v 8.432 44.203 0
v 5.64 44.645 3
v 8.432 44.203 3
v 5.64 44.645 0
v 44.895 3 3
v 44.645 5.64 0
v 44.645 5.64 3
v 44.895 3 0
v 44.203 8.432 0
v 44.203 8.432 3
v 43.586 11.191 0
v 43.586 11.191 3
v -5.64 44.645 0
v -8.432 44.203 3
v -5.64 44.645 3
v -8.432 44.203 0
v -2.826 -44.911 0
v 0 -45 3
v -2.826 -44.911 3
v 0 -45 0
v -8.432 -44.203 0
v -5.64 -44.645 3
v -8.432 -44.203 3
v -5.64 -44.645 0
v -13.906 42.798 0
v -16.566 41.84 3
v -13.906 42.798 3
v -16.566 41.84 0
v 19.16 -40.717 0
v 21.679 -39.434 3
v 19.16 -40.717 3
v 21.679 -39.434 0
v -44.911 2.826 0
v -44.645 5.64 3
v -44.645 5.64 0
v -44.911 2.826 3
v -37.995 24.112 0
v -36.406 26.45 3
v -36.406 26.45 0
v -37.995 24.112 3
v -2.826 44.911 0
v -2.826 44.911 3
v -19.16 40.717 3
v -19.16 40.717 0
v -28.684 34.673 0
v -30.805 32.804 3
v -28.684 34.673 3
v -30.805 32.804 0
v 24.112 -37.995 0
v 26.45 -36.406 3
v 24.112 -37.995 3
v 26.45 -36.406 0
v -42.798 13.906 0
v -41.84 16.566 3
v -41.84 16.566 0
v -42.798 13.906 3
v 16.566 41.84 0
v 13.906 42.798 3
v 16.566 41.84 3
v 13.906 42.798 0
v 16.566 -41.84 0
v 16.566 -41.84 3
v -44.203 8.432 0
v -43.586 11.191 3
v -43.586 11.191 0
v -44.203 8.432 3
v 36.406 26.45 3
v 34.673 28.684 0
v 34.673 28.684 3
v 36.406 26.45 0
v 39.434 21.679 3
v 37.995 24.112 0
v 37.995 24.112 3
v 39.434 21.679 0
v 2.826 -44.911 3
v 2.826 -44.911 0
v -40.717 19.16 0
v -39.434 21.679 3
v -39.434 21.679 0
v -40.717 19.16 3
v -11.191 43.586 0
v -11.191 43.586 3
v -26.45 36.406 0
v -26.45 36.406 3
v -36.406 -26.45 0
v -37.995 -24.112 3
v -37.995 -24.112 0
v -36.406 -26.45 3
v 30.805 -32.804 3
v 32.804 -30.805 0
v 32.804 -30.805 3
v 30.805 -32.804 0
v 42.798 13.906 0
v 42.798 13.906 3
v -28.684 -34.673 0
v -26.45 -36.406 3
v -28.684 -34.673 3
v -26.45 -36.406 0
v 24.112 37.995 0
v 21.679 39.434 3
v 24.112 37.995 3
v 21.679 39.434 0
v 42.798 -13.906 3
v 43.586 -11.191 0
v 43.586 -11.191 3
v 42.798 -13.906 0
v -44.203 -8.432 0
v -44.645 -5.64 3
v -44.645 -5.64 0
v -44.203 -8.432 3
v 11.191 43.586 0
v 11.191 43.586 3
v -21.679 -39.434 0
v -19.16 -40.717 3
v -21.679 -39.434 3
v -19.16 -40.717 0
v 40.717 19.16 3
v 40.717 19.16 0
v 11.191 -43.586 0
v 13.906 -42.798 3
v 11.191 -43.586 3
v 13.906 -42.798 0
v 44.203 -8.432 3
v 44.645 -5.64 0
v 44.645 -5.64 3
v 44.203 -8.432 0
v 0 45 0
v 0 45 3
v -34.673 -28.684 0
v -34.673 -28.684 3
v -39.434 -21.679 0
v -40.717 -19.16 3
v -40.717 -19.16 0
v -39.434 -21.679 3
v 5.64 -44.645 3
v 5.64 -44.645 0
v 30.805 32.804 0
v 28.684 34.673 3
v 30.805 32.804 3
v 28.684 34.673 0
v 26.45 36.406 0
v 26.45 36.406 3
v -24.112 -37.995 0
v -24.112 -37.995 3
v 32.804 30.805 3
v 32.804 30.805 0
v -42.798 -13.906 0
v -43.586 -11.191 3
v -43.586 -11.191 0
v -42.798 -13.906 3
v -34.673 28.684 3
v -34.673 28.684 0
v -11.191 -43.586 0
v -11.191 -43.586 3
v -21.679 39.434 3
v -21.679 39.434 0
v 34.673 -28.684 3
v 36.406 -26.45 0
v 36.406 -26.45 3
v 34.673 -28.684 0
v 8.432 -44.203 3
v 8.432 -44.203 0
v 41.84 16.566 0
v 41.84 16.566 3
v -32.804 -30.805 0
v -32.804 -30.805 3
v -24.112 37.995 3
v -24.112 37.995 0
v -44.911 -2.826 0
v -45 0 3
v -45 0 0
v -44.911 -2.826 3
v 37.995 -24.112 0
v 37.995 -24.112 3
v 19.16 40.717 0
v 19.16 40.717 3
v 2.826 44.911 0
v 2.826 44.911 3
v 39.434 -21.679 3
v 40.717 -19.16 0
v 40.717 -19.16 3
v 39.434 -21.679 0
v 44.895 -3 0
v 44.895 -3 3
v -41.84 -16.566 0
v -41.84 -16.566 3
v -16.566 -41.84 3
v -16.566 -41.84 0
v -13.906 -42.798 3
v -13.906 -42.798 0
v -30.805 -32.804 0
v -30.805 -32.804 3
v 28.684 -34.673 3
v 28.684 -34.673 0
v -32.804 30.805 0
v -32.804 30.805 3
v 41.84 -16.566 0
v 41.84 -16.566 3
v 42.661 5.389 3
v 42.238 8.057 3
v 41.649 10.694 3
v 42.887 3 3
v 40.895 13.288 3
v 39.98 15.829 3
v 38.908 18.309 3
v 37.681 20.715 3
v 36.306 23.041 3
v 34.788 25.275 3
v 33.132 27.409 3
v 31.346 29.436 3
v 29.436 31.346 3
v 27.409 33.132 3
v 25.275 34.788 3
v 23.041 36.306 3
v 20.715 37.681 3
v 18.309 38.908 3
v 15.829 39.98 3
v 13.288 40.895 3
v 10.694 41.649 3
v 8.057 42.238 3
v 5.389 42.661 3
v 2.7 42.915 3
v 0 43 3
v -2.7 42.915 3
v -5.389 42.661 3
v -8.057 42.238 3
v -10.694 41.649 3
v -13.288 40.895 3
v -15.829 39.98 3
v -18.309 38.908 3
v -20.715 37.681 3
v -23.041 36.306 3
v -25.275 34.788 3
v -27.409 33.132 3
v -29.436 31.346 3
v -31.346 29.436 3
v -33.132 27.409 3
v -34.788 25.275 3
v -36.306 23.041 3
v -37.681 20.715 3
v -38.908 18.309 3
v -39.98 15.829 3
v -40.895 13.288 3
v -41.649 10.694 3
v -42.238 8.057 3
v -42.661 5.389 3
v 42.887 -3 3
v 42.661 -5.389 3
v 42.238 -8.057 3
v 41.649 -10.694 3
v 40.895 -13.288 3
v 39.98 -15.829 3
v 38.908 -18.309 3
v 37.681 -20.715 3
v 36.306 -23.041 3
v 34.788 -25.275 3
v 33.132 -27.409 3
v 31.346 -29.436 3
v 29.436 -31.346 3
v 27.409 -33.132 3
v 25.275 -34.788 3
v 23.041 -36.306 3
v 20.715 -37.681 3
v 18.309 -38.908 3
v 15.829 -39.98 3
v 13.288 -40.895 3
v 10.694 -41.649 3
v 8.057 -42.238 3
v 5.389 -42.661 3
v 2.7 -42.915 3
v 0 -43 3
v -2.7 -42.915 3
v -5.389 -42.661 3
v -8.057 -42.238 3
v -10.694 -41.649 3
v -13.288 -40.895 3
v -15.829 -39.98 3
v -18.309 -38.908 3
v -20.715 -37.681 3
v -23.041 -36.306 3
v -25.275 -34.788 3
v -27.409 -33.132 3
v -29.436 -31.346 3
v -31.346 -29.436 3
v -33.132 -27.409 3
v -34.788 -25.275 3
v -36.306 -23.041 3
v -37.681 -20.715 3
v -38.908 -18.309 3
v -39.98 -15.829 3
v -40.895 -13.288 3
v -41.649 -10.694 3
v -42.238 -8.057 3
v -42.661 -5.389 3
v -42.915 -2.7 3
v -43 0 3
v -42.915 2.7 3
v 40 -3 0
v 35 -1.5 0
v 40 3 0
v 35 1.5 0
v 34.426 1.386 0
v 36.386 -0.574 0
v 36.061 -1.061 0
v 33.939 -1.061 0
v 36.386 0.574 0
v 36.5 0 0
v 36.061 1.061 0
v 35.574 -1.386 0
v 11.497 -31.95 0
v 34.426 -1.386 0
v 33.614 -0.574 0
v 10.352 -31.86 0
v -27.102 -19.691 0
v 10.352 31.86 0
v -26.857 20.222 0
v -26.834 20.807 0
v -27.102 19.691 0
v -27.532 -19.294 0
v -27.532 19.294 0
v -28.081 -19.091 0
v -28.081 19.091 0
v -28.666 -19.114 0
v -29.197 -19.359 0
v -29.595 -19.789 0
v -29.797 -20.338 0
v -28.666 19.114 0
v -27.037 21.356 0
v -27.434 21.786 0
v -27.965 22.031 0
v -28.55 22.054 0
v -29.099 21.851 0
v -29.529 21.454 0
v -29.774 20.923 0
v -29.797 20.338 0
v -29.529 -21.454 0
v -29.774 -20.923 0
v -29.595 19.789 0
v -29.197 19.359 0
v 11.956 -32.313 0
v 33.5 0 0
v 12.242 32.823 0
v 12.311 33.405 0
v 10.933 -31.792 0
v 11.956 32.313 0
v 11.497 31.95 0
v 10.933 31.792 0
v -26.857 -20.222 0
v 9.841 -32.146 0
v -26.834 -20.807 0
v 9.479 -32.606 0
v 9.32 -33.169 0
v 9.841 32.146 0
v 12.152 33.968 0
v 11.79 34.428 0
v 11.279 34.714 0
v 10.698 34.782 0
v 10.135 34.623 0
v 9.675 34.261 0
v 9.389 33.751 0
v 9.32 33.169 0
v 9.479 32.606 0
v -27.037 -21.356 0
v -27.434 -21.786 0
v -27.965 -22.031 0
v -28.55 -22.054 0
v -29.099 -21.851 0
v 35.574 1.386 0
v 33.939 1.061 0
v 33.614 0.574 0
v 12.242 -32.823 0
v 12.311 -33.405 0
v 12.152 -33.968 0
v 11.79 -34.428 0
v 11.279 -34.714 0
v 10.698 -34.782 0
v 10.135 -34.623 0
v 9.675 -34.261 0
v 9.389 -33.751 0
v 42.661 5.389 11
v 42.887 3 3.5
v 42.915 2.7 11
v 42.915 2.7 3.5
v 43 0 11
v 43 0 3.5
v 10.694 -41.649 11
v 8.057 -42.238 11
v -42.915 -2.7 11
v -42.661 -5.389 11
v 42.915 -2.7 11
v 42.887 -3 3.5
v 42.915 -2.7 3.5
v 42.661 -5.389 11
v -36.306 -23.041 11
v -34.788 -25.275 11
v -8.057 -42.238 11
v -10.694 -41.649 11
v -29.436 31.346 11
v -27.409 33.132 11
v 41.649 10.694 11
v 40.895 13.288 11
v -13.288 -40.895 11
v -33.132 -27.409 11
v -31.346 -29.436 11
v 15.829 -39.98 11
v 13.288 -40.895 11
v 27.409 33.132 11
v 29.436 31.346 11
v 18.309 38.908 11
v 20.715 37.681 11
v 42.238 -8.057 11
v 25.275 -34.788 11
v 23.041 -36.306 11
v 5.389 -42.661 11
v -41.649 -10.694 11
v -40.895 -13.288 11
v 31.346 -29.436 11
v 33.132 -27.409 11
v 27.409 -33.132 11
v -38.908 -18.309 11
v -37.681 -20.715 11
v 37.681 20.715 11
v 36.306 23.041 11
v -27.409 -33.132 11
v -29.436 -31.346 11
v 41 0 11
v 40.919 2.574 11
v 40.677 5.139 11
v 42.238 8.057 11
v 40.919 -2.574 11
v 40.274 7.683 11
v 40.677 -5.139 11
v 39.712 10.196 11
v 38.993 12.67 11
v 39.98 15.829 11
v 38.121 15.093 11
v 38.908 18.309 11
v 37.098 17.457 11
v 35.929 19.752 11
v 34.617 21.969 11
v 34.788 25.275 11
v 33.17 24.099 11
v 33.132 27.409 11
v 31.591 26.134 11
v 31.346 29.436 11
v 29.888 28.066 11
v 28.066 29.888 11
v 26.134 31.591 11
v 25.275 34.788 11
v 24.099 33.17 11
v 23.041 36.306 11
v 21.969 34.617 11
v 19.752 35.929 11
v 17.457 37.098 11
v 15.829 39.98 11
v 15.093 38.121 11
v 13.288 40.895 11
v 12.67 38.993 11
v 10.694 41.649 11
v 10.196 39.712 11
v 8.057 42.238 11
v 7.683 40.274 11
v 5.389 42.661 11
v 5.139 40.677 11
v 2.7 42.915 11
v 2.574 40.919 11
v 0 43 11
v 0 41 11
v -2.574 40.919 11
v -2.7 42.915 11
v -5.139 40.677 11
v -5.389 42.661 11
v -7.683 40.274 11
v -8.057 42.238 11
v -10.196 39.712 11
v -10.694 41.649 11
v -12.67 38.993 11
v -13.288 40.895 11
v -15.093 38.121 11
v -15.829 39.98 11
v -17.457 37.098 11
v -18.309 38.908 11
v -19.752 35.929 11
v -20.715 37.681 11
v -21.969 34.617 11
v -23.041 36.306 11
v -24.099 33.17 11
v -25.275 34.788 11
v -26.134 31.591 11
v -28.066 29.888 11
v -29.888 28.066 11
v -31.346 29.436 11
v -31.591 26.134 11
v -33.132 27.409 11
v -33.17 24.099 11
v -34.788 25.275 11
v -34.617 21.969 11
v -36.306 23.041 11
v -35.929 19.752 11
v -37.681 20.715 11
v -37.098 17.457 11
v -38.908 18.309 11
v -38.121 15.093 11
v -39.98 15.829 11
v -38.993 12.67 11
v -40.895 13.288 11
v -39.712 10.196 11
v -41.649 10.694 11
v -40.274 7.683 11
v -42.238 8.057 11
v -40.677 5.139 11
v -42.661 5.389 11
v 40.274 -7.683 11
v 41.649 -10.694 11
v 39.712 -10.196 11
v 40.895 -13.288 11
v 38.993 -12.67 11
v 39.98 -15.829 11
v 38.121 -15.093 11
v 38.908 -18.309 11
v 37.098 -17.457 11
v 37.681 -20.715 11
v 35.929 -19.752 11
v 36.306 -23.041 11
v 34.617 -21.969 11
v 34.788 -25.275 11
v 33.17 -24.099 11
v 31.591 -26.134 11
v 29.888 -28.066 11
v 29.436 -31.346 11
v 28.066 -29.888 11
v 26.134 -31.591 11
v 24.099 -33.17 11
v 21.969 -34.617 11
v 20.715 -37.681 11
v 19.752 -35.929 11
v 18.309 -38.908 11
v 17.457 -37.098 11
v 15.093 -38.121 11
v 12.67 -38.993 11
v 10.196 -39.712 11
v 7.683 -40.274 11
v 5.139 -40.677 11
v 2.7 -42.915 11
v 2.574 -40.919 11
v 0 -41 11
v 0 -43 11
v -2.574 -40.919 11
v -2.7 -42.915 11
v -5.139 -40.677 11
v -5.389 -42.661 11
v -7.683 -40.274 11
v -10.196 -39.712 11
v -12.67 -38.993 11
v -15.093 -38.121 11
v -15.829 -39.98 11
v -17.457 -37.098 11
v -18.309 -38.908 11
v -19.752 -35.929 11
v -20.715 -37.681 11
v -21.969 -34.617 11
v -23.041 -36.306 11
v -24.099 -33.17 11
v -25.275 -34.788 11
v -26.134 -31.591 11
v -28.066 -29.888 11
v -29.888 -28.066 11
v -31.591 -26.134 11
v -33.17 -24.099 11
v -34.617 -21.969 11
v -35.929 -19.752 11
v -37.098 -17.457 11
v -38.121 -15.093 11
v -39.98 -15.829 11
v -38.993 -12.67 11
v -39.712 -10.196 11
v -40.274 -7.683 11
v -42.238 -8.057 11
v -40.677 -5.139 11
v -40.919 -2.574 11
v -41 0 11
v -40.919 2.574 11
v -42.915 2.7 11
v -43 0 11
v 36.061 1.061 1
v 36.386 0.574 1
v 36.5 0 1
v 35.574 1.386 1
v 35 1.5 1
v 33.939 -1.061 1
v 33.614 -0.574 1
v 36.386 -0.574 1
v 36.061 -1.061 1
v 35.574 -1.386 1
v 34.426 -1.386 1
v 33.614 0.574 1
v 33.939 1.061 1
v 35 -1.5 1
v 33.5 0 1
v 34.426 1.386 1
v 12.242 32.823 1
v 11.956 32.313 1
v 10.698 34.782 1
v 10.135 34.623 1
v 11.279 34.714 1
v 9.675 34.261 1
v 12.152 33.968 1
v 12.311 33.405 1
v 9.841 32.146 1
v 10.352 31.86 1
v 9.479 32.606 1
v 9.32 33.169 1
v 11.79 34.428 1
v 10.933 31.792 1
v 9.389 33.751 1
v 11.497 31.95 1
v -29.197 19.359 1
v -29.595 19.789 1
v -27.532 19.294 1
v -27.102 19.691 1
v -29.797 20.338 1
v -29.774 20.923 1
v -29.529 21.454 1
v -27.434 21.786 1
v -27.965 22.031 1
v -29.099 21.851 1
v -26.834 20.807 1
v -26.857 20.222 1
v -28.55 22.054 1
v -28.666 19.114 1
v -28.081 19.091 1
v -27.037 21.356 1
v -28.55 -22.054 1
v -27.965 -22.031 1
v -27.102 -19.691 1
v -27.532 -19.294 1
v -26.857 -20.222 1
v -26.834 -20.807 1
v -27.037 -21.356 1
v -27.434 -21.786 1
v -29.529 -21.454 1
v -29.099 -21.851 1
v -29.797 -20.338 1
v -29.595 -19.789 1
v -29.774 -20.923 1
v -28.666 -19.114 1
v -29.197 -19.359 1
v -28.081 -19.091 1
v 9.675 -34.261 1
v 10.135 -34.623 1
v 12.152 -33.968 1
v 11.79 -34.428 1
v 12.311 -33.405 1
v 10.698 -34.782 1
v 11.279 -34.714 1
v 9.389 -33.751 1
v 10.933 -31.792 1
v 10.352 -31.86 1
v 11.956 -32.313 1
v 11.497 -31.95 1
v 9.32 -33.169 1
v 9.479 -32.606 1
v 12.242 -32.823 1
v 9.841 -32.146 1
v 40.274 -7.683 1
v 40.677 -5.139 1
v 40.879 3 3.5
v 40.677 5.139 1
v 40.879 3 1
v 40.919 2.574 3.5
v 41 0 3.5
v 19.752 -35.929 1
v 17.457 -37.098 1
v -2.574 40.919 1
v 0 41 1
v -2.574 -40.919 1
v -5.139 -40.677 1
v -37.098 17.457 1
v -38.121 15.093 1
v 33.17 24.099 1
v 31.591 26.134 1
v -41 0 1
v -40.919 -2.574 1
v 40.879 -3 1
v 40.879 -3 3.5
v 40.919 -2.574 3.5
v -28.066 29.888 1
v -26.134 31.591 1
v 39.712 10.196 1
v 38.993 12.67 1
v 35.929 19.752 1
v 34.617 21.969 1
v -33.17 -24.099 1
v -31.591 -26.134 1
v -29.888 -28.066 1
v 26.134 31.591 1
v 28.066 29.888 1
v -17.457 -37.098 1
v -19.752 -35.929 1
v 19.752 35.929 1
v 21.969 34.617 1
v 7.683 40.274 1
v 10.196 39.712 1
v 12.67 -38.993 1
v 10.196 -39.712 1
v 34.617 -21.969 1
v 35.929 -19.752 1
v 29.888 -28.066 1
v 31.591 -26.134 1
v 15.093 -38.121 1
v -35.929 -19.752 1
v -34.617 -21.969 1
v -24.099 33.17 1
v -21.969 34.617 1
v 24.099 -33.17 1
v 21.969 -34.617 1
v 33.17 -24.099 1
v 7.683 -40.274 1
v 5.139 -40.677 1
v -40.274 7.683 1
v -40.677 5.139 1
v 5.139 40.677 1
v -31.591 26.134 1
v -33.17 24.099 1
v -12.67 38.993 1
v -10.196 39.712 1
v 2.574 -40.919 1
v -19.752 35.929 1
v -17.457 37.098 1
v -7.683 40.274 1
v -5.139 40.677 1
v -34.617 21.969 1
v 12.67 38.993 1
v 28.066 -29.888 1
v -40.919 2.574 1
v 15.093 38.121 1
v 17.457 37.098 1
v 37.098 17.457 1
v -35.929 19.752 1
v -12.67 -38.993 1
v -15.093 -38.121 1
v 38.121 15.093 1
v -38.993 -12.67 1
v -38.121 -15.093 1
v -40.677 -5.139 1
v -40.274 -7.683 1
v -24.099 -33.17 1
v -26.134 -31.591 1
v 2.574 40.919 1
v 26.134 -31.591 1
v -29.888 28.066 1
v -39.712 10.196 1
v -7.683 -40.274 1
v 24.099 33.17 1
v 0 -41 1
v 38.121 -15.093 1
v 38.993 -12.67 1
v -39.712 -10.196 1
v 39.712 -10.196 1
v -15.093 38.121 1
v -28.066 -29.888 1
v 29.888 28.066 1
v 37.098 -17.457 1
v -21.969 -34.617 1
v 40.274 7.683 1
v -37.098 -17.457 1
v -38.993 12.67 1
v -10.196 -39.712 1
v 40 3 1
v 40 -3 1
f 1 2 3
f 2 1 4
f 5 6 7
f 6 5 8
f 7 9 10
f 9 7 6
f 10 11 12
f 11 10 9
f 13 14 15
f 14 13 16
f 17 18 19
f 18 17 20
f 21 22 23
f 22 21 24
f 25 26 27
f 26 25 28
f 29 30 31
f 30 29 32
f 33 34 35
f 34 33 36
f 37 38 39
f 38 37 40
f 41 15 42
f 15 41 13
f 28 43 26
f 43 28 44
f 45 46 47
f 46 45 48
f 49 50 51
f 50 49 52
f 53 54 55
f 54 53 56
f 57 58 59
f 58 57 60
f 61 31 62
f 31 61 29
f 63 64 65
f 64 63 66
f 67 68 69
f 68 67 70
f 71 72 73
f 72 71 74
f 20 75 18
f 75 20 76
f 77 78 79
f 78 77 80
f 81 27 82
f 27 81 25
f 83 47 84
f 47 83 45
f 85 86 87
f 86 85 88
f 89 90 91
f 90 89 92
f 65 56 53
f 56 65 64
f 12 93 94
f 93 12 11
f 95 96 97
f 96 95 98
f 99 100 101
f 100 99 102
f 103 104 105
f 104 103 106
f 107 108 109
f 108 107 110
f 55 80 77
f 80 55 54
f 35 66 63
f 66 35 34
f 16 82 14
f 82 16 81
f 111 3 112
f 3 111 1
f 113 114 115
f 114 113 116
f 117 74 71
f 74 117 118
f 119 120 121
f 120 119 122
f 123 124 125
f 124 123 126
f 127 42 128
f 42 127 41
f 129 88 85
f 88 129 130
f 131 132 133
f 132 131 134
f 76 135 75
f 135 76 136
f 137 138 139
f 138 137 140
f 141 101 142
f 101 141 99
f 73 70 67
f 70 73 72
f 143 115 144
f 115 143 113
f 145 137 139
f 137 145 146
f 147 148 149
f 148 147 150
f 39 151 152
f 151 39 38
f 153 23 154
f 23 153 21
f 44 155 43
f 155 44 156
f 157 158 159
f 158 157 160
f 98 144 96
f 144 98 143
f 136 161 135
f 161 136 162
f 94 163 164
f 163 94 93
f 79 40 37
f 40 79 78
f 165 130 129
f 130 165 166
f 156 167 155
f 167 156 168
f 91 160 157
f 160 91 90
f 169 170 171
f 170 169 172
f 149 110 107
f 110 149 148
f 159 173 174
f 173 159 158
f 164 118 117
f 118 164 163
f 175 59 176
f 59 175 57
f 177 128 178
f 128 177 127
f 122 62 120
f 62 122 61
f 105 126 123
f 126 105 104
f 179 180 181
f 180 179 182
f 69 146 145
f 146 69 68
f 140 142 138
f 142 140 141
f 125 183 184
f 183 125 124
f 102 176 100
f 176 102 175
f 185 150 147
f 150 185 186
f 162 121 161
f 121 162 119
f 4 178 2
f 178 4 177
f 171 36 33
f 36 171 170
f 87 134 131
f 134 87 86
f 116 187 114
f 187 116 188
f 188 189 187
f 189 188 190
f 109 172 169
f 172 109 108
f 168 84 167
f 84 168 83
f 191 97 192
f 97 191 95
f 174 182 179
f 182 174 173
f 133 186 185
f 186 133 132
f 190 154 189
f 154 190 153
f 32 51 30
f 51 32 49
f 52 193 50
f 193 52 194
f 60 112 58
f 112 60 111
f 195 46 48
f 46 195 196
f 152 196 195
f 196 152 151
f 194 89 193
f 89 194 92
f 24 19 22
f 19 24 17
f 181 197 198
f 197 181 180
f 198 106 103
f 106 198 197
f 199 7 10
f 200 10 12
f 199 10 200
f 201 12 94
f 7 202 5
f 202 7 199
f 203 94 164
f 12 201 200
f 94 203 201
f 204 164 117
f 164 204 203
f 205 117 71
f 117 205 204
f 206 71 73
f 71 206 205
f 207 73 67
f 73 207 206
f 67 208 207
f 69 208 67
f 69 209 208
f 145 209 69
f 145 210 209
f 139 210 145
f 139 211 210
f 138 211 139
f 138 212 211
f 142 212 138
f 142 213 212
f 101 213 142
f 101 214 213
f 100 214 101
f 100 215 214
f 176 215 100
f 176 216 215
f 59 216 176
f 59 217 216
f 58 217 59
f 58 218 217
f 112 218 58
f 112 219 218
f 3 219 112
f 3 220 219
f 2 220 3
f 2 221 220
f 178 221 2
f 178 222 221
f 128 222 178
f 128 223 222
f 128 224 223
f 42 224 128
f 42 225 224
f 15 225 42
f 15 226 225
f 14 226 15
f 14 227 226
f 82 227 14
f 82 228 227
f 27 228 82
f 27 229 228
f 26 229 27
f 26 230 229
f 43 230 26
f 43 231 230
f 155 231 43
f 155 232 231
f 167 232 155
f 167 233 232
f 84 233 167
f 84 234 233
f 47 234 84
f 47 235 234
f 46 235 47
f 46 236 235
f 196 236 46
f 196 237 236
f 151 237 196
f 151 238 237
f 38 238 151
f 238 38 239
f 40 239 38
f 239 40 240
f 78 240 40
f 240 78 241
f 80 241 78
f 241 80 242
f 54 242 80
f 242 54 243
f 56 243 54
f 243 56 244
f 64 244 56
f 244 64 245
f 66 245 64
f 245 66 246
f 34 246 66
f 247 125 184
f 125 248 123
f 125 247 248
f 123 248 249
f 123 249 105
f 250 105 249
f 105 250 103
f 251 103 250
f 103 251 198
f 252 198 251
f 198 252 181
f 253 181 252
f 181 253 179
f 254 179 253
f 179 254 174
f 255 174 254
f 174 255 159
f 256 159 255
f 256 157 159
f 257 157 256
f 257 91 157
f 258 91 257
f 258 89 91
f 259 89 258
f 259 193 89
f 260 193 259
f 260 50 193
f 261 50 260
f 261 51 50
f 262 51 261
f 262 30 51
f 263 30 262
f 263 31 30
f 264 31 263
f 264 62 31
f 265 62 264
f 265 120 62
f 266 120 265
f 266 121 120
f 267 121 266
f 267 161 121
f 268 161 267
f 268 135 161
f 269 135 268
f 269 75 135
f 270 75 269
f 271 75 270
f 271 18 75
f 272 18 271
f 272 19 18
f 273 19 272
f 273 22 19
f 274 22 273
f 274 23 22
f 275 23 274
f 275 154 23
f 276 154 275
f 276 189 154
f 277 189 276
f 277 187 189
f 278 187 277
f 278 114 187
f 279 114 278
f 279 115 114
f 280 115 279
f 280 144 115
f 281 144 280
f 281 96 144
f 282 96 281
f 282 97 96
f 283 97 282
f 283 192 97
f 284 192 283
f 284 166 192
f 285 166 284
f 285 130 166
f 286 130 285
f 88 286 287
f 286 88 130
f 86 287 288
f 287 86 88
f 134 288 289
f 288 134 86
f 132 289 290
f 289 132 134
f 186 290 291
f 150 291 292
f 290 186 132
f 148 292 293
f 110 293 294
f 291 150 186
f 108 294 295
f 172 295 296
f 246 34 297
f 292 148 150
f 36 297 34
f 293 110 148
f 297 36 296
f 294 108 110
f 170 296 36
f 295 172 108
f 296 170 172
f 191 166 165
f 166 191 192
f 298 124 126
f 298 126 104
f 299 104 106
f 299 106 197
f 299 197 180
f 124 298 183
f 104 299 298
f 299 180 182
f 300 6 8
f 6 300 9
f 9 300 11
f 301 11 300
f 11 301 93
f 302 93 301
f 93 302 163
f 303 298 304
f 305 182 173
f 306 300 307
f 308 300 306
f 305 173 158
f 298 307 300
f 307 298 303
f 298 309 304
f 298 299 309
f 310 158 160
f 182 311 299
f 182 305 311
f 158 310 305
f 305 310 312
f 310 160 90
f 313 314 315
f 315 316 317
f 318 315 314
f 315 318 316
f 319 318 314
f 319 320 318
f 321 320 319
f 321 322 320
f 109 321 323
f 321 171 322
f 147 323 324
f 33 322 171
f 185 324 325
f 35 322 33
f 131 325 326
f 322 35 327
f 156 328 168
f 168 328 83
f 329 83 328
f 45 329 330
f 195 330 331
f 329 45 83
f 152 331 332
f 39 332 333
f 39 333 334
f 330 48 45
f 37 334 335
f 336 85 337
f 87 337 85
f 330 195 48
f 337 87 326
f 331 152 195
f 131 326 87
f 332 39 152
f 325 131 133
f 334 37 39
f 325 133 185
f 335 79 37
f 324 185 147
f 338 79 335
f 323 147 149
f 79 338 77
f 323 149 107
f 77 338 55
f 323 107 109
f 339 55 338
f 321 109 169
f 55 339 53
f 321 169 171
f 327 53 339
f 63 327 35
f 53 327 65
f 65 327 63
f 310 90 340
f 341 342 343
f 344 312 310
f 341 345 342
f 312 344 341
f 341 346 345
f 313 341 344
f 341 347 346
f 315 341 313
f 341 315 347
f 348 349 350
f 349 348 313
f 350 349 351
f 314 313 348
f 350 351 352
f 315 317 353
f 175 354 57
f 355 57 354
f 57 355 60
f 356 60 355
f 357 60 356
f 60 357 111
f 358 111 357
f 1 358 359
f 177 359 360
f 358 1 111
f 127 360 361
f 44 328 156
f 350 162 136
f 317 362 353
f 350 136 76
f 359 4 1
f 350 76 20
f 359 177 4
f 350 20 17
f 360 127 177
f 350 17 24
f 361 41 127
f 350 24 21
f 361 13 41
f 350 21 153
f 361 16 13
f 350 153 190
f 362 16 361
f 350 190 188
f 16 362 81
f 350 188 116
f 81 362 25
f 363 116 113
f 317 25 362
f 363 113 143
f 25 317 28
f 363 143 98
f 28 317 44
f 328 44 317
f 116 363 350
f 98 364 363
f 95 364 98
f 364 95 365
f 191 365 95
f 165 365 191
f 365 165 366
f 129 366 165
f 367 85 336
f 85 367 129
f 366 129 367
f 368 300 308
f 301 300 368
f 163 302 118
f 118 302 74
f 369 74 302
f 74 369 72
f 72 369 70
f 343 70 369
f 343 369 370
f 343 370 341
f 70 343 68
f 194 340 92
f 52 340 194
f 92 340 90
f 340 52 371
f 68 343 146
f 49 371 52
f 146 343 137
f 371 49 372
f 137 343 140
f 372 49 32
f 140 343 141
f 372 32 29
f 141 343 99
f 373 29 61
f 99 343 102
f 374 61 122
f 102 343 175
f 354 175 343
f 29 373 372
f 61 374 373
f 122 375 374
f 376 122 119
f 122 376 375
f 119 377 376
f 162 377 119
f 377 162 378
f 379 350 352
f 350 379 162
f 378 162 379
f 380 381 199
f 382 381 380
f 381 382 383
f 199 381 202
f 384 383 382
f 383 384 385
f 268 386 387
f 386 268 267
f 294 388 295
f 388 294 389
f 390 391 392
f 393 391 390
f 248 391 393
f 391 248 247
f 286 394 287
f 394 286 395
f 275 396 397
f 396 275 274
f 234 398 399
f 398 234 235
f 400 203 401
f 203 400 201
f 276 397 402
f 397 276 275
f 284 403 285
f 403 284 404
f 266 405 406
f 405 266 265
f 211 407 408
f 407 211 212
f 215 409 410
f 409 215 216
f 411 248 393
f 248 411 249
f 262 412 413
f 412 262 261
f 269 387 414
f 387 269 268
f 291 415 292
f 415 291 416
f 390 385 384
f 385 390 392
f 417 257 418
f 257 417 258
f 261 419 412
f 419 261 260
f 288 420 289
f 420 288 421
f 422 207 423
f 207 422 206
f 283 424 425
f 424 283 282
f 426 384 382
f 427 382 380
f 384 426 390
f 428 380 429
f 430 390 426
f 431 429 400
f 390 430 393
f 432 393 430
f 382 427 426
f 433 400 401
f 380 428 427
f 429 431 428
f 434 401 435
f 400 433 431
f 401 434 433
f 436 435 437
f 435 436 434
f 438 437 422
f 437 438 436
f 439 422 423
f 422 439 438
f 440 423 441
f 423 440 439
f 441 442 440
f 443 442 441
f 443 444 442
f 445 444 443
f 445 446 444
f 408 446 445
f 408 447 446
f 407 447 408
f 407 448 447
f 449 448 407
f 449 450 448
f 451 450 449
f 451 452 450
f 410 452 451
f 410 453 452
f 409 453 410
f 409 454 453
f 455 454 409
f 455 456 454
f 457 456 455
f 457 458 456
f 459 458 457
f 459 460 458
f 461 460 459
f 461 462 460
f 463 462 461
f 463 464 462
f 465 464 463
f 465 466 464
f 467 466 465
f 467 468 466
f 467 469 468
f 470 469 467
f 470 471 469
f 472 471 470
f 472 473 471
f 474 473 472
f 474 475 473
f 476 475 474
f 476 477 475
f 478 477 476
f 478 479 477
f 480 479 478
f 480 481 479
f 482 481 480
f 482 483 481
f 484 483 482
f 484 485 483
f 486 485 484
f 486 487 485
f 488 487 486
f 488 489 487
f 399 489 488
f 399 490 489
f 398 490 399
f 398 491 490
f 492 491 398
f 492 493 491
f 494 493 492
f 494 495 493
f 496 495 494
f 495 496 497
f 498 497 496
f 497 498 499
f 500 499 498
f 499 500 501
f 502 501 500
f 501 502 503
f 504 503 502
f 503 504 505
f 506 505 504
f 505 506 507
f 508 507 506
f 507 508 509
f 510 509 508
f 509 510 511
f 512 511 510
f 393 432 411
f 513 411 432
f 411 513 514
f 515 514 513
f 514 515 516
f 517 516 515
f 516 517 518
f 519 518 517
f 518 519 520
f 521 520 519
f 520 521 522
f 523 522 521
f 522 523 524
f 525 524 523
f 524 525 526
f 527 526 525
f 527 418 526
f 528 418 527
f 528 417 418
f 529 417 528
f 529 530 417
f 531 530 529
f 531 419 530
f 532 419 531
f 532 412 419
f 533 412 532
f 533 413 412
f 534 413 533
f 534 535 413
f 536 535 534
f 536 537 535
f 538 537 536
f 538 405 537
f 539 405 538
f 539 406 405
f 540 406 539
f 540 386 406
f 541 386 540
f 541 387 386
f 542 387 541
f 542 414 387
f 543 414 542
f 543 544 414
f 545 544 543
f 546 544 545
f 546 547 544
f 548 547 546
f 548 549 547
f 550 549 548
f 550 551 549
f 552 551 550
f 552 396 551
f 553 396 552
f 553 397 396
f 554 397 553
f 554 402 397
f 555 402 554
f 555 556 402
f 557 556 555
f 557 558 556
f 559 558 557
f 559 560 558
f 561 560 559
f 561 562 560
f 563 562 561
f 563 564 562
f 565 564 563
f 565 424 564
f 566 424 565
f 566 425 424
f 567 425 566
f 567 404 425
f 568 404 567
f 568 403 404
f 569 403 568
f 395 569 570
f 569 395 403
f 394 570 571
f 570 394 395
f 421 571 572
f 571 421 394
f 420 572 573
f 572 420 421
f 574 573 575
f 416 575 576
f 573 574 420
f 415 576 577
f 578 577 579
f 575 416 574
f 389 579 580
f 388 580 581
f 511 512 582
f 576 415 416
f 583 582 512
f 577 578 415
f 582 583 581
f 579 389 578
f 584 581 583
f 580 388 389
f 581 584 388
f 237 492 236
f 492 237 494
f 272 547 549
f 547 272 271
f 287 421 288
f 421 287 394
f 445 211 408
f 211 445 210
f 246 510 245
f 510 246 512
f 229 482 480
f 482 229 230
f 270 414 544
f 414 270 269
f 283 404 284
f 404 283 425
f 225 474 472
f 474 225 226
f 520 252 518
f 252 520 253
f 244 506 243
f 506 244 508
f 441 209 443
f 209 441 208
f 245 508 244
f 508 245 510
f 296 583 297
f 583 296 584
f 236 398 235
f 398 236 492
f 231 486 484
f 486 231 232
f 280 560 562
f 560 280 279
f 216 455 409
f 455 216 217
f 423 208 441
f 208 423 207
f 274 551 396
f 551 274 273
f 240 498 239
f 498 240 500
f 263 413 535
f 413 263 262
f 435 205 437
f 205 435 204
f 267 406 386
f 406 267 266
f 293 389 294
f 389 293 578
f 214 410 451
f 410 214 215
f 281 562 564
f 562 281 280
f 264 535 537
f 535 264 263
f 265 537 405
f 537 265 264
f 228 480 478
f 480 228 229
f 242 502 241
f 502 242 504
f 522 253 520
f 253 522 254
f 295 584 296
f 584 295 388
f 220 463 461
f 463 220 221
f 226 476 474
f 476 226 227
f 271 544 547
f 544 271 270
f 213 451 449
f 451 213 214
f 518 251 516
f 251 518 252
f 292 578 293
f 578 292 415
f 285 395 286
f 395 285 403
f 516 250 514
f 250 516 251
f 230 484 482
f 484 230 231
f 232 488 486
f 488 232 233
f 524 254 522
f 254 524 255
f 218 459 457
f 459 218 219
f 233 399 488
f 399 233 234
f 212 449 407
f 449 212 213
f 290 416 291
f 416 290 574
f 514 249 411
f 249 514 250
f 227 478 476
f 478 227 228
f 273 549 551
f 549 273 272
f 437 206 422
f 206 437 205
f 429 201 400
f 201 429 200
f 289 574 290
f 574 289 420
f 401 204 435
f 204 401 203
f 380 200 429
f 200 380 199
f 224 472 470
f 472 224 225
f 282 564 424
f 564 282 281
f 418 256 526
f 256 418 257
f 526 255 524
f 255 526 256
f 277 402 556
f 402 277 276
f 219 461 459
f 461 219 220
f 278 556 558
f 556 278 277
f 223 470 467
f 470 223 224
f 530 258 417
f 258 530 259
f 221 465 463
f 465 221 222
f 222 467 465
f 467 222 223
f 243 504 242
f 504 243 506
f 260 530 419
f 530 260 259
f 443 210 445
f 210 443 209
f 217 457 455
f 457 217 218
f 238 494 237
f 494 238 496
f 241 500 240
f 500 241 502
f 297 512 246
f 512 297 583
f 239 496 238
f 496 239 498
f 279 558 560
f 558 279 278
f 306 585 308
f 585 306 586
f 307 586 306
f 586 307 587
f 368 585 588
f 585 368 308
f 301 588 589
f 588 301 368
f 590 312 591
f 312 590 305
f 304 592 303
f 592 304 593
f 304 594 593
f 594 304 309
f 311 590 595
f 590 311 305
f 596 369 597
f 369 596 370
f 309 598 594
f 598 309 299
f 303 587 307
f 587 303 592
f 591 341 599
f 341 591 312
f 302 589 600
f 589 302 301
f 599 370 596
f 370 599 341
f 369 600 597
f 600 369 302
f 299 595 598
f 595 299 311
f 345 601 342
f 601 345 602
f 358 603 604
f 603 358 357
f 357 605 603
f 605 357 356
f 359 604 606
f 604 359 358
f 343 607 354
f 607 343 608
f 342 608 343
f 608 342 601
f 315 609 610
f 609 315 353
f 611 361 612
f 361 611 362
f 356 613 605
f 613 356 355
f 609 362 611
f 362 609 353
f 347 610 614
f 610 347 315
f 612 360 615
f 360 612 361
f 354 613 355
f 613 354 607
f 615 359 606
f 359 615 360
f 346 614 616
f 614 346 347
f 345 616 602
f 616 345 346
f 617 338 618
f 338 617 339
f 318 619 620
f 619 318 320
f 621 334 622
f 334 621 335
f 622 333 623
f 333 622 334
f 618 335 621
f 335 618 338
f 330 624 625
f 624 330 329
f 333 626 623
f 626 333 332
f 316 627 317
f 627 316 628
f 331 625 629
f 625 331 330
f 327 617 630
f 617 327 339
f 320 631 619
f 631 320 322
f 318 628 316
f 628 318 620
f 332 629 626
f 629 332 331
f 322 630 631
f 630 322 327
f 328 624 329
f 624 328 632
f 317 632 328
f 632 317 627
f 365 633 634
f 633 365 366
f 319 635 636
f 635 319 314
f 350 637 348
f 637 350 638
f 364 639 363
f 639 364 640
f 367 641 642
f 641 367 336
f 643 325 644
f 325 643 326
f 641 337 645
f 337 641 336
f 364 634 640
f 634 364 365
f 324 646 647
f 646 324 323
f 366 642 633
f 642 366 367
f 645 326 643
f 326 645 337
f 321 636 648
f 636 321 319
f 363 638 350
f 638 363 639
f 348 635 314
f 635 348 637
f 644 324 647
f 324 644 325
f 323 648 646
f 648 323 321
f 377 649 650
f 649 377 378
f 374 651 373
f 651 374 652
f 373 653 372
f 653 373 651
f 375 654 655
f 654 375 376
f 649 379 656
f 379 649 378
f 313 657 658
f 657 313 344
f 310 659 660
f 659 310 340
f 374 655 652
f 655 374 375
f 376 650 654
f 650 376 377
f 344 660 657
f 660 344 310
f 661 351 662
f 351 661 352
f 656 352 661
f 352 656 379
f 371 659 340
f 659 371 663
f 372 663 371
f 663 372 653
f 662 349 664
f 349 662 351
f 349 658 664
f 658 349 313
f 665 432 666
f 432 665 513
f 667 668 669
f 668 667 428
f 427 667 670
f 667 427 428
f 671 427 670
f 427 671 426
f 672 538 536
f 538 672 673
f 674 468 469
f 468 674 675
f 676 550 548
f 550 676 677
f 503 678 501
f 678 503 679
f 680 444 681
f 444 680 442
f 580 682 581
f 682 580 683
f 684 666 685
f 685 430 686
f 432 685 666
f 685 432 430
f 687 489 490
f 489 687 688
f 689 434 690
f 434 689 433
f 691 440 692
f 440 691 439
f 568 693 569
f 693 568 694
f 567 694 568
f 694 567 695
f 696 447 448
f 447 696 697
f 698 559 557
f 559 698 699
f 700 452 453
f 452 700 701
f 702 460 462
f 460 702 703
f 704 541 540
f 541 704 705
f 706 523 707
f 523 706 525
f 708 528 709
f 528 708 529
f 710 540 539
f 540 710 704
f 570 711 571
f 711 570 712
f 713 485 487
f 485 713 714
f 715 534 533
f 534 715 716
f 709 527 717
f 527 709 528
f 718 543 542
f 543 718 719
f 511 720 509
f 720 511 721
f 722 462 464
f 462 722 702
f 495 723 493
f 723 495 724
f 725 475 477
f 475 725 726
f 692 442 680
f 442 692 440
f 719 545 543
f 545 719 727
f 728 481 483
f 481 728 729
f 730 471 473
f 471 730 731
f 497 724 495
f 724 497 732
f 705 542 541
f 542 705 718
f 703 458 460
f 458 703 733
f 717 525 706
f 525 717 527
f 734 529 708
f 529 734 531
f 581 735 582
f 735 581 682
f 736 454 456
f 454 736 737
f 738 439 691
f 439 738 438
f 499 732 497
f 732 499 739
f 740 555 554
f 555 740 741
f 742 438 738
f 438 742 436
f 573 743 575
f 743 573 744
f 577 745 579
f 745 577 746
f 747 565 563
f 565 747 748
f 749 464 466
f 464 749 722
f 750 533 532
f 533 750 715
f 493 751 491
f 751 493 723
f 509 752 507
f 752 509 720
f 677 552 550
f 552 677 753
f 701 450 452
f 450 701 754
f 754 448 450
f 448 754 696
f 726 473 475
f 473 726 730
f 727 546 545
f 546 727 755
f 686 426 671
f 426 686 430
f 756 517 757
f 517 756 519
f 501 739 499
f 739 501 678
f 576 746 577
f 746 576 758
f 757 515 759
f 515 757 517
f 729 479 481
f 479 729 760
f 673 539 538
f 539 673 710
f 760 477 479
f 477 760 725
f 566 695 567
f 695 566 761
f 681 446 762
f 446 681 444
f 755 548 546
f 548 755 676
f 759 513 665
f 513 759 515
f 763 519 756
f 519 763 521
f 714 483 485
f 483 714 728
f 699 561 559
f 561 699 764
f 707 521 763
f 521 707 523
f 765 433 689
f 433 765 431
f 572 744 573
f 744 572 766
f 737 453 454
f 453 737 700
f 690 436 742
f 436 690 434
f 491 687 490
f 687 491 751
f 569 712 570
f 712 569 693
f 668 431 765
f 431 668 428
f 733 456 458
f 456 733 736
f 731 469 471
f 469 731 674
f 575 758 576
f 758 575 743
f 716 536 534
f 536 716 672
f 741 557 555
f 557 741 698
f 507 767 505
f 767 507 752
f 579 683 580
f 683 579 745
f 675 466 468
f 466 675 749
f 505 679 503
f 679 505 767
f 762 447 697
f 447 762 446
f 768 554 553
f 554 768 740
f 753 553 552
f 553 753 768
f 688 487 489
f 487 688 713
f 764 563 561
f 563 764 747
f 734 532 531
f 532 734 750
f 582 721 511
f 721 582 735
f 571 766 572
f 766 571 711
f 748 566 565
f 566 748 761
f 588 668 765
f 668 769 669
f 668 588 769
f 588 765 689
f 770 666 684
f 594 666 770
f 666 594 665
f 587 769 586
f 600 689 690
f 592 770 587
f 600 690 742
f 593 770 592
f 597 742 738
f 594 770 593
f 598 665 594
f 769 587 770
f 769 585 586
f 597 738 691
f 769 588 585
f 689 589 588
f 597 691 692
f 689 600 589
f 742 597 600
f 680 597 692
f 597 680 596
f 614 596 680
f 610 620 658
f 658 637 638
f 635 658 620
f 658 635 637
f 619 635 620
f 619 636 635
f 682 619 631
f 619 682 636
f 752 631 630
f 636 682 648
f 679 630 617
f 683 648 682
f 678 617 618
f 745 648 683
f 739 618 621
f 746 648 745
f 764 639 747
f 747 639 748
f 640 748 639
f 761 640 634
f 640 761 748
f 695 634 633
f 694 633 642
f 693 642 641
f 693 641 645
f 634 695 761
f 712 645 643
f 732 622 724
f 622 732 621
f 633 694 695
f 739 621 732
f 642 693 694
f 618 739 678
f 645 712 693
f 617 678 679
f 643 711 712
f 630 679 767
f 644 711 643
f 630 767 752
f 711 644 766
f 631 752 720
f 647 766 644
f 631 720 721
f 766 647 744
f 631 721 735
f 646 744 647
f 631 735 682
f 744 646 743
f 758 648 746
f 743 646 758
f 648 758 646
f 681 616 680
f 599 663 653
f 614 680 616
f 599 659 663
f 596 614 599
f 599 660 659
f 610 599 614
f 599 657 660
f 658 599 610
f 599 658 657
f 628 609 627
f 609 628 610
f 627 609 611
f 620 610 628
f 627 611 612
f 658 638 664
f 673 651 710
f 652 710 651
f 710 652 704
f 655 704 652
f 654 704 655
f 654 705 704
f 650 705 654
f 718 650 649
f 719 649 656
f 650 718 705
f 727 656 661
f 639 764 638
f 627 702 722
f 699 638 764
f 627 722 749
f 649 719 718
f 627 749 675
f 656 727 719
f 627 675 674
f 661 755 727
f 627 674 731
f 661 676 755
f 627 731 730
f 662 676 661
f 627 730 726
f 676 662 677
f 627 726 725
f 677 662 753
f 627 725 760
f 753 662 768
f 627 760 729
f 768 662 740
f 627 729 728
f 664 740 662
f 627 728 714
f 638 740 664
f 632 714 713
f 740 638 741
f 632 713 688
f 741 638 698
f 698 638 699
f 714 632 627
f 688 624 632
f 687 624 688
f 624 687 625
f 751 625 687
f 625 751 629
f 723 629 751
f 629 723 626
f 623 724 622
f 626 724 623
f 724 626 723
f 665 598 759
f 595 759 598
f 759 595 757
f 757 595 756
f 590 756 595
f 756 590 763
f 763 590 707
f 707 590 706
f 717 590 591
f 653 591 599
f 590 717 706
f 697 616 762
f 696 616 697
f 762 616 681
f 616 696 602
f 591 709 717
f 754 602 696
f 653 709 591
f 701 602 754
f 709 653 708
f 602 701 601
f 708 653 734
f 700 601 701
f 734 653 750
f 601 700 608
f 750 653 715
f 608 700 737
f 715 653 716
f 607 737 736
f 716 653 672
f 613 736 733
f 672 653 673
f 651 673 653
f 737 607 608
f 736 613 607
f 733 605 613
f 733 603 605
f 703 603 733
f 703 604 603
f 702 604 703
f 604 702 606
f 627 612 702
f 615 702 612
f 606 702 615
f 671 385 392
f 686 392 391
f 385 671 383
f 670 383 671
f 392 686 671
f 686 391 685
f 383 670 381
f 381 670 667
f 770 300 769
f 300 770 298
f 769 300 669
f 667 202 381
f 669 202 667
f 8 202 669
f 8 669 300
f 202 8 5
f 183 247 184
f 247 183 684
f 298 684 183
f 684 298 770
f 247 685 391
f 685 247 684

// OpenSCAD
// Нижняя крышка Яндекс Станции Мини 2
// Bottom cover for Yandex Station Mini 2
fn = 10000;

module bottom_cover() {
    difference() {
        // Основание крышки - основная форма
        union() {
            // Центральная часть - круглая основа
            cylinder(h = 3, r = 45, center = false, $fn = 100);
            
            // Боковые стенки для крепления
            translate([0, 0, 3])
            cylinder(h = 8, r = 43, center = false, $fn = 100);
            
            // Бугорок для перенаправления звука (центральный элемент)
            translate([0, 0, 3])
            cylinder(h = 5, r = 8, $fn = 50);
        }
        
        // Внутренняя полость
        translate([0, 0, 1])
        cylinder(h = 10, r = 41, center = false, $fn = 100);
        
        // Отверстия для винтов крепления (5 штук)
        for (i = [0:4]) {
            rotate([0, 0, i * 72])
            translate([35, 0, -0.5])
            cylinder(h = 5, r = 1.5, $fn = 16);
        }
        
        // Углубления для головок винтов
        for (i = [0:4]) {
            rotate([0, 0, i * 72])
            translate([35, 0, 2])
            cylinder(h = 2, r = 3, $fn = 16);
        }
        
        // Паз для кабеля питания
        translate([40, -3, -0.5])
        cube([10, 6, 4]);
    }
}
// Рендерим крышку
bottom_cover();
